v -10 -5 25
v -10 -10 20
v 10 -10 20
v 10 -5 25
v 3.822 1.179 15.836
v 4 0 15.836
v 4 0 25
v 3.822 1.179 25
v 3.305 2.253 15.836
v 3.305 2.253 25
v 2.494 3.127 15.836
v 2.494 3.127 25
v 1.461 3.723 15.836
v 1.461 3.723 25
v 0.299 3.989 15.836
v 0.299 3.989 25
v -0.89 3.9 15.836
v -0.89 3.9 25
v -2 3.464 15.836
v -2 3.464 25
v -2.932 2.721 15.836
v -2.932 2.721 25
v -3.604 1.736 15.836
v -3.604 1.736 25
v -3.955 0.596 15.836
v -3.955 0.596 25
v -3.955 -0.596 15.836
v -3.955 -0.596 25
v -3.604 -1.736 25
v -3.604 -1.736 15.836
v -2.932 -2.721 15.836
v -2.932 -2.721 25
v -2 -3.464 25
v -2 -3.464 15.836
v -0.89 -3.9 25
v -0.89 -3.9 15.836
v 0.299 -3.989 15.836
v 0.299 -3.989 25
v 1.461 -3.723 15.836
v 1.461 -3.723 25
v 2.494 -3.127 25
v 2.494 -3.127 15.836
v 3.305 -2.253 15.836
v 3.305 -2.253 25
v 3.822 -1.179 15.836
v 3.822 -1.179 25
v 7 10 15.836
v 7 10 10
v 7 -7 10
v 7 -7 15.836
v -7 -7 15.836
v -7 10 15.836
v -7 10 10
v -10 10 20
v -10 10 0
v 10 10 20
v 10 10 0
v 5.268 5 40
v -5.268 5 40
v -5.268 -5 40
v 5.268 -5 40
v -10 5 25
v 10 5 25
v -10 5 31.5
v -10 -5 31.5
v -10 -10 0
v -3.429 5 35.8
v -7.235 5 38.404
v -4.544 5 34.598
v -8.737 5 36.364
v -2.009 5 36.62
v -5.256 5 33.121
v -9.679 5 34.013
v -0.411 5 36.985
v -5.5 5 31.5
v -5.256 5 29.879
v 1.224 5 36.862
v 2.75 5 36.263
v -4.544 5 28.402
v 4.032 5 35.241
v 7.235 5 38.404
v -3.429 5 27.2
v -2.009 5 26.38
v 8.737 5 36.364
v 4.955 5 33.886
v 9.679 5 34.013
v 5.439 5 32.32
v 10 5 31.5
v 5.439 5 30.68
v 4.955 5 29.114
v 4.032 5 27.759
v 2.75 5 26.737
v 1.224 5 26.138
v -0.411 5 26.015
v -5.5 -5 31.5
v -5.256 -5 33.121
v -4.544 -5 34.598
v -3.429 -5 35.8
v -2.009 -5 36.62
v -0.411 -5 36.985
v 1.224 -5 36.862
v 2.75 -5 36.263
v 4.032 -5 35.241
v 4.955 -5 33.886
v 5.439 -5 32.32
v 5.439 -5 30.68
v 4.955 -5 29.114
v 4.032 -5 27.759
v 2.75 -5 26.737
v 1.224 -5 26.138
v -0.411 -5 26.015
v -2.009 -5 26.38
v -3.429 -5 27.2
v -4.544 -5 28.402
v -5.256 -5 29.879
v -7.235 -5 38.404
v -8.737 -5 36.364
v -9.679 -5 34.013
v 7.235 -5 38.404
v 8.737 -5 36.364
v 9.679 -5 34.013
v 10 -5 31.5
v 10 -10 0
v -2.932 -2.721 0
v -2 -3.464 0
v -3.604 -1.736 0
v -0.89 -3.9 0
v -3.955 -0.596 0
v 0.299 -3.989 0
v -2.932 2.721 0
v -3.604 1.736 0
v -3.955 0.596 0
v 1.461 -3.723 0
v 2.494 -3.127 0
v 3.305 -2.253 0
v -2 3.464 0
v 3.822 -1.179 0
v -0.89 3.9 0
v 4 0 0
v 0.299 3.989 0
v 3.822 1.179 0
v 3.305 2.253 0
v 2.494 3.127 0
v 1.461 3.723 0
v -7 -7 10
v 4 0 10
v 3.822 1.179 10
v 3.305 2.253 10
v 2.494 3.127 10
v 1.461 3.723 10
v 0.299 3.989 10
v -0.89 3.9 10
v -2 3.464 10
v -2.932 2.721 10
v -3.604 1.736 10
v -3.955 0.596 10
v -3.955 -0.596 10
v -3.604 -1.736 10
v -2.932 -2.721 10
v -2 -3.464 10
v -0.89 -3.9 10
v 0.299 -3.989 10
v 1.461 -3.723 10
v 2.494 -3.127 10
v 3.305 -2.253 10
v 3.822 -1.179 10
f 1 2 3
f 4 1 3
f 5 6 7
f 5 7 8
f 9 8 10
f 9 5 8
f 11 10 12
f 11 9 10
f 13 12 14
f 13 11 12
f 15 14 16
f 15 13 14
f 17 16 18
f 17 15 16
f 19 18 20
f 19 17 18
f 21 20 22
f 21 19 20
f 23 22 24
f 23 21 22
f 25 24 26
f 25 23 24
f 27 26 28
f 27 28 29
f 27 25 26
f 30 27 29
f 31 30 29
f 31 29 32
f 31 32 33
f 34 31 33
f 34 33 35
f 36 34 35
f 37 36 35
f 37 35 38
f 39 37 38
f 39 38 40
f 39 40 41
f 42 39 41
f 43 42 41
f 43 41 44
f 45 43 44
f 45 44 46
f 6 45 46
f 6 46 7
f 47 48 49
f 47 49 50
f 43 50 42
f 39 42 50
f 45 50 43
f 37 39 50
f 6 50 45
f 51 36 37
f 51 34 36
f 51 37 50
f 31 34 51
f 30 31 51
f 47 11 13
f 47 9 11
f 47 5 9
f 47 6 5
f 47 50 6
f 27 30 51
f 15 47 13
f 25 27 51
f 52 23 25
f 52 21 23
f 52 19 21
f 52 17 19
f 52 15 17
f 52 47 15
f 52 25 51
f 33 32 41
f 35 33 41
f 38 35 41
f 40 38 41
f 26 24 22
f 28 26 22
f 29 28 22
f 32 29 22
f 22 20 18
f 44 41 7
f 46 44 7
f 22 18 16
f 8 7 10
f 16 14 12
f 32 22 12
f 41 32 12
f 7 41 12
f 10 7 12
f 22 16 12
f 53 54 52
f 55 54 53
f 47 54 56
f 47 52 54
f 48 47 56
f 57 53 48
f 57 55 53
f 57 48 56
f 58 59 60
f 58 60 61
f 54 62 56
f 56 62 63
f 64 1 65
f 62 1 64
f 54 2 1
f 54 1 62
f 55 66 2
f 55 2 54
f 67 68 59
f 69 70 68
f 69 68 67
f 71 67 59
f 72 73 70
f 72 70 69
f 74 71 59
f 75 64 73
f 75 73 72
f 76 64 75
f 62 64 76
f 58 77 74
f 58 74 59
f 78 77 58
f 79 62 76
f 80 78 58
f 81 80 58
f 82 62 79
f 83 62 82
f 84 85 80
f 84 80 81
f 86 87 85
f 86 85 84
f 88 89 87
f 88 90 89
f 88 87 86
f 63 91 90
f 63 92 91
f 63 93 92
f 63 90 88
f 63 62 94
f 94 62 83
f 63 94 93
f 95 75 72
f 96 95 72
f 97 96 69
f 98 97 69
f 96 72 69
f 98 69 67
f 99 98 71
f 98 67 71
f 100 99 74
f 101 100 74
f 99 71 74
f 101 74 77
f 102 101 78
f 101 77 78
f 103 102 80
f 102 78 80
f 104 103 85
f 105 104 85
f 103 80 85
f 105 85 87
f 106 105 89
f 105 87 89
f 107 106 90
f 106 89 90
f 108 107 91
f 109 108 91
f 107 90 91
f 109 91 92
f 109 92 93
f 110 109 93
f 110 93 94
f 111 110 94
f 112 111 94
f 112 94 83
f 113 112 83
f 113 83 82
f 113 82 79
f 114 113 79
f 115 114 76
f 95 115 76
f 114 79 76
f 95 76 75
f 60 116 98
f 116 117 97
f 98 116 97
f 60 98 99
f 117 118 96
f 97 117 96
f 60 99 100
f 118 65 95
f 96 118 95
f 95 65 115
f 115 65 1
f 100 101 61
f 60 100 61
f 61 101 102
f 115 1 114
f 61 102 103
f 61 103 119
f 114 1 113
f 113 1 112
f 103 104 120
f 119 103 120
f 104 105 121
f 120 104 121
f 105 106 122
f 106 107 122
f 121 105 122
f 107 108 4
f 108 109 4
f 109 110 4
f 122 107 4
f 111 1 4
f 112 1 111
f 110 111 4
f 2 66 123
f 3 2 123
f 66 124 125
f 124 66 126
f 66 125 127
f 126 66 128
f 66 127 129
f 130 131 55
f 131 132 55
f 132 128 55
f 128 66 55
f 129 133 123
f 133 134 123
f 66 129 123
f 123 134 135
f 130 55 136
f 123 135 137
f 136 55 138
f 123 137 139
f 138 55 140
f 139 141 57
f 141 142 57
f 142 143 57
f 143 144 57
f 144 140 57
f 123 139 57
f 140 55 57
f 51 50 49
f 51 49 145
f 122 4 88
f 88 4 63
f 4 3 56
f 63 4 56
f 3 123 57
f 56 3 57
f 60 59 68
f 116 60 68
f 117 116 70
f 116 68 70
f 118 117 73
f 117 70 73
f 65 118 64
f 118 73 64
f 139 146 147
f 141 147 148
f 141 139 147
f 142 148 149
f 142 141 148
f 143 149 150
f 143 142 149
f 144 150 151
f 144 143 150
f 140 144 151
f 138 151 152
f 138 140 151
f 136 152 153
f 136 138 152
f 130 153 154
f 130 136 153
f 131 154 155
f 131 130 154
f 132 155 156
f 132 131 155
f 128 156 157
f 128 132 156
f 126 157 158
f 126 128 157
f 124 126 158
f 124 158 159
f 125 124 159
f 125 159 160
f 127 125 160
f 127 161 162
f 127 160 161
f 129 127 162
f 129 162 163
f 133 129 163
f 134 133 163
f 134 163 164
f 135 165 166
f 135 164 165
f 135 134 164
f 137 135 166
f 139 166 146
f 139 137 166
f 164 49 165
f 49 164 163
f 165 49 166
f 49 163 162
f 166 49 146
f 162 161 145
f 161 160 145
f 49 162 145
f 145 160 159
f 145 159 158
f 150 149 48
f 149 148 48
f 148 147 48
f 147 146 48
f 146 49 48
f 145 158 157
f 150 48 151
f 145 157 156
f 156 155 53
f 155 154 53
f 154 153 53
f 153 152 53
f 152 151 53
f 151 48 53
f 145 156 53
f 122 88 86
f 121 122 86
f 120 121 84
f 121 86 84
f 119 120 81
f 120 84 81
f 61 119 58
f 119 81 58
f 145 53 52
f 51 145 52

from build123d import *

# Parameters (mm, degrees)
F0_W      = 20
F0_H      = 20
F0_R      = 4
F1_DEPTH  = 25
F3_W      = 14
F3_H      = 5.8359876275
F4_DEPTH  = 17
F6_W      = 20
F6_H      = 10
F7_DEPTH  = 15
F10_DEPTH = 10
F9_R      = 5.5
F11_DEPTH = 10
F12_SIZE  = 4.99999


# Not quite as in the source:
# - a fillet or chamfer is up to 0.001 mm smaller than in the source, because OpenCascade refuses the exact size


with BuildPart() as f1:
    # F0 (on Top) → F1 (new body)
    with BuildSketch(Plane.XY):
        Rectangle(F0_W, F0_H)
        Circle(F0_R, mode=Mode.SUBTRACT)
    extrude(amount=F1_DEPTH)

    # F3 (on offset) → F4 (cut)
    with BuildSketch(Plane(origin=(0, 10, 0), x_dir=(-1, 0, 0), z_dir=(0, 1, 0))):
        with Locations((0, 12.9179938138)):
            Rectangle(F3_W, F3_H)
    extrude(amount=-F4_DEPTH, mode=Mode.SUBTRACT)

    # F6 (on offset) → F7 (join)
    with BuildSketch(Plane.XY.offset(25)):
        Rectangle(F6_W, F6_H)
    extrude(amount=F7_DEPTH)

    # F9 (on offset) → F10 (cut)
    with BuildSketch(Plane(origin=(0, 5, 0), x_dir=(-1, 0, 0), z_dir=(0, 1, 0))):
        with BuildLine():
            Line((-5.2678268764, 40), (-10, 40))
            Line((-10, 40), (-10, 31.5))
            ThreePointArc((-10, 31.5), (-8.7372269275, 36.3642435813), (-5.2678268764, 40))
        make_face()
        with BuildLine():
            Line((10, 40), (5.2678268764, 40))
            ThreePointArc((5.2678268764, 40), (8.7372269275, 36.3642435813), (10, 31.5))
            Line((10, 31.5), (10, 40))
        make_face()
    extrude(amount=-F10_DEPTH, mode=Mode.SUBTRACT)

    # F9 (on offset) → F11 (cut)
    with BuildSketch(Plane(origin=(0, 5, 0), x_dir=(-1, 0, 0), z_dir=(0, 1, 0))):
        with Locations((0, 31.5)):
            Circle(F9_R)
    extrude(amount=-F11_DEPTH, mode=Mode.SUBTRACT)

    # F12 (size 5 in the source; OpenCascade refuses exactly that, so slightly less here)
    f12_edges = [f1.edges().sort_by_distance(p)[0] for p in [
        (0, -10, 25),
        (0, 10, 25),
    ]]
    chamfer(f12_edges, length=F12_SIZE)


solid = f1.part
